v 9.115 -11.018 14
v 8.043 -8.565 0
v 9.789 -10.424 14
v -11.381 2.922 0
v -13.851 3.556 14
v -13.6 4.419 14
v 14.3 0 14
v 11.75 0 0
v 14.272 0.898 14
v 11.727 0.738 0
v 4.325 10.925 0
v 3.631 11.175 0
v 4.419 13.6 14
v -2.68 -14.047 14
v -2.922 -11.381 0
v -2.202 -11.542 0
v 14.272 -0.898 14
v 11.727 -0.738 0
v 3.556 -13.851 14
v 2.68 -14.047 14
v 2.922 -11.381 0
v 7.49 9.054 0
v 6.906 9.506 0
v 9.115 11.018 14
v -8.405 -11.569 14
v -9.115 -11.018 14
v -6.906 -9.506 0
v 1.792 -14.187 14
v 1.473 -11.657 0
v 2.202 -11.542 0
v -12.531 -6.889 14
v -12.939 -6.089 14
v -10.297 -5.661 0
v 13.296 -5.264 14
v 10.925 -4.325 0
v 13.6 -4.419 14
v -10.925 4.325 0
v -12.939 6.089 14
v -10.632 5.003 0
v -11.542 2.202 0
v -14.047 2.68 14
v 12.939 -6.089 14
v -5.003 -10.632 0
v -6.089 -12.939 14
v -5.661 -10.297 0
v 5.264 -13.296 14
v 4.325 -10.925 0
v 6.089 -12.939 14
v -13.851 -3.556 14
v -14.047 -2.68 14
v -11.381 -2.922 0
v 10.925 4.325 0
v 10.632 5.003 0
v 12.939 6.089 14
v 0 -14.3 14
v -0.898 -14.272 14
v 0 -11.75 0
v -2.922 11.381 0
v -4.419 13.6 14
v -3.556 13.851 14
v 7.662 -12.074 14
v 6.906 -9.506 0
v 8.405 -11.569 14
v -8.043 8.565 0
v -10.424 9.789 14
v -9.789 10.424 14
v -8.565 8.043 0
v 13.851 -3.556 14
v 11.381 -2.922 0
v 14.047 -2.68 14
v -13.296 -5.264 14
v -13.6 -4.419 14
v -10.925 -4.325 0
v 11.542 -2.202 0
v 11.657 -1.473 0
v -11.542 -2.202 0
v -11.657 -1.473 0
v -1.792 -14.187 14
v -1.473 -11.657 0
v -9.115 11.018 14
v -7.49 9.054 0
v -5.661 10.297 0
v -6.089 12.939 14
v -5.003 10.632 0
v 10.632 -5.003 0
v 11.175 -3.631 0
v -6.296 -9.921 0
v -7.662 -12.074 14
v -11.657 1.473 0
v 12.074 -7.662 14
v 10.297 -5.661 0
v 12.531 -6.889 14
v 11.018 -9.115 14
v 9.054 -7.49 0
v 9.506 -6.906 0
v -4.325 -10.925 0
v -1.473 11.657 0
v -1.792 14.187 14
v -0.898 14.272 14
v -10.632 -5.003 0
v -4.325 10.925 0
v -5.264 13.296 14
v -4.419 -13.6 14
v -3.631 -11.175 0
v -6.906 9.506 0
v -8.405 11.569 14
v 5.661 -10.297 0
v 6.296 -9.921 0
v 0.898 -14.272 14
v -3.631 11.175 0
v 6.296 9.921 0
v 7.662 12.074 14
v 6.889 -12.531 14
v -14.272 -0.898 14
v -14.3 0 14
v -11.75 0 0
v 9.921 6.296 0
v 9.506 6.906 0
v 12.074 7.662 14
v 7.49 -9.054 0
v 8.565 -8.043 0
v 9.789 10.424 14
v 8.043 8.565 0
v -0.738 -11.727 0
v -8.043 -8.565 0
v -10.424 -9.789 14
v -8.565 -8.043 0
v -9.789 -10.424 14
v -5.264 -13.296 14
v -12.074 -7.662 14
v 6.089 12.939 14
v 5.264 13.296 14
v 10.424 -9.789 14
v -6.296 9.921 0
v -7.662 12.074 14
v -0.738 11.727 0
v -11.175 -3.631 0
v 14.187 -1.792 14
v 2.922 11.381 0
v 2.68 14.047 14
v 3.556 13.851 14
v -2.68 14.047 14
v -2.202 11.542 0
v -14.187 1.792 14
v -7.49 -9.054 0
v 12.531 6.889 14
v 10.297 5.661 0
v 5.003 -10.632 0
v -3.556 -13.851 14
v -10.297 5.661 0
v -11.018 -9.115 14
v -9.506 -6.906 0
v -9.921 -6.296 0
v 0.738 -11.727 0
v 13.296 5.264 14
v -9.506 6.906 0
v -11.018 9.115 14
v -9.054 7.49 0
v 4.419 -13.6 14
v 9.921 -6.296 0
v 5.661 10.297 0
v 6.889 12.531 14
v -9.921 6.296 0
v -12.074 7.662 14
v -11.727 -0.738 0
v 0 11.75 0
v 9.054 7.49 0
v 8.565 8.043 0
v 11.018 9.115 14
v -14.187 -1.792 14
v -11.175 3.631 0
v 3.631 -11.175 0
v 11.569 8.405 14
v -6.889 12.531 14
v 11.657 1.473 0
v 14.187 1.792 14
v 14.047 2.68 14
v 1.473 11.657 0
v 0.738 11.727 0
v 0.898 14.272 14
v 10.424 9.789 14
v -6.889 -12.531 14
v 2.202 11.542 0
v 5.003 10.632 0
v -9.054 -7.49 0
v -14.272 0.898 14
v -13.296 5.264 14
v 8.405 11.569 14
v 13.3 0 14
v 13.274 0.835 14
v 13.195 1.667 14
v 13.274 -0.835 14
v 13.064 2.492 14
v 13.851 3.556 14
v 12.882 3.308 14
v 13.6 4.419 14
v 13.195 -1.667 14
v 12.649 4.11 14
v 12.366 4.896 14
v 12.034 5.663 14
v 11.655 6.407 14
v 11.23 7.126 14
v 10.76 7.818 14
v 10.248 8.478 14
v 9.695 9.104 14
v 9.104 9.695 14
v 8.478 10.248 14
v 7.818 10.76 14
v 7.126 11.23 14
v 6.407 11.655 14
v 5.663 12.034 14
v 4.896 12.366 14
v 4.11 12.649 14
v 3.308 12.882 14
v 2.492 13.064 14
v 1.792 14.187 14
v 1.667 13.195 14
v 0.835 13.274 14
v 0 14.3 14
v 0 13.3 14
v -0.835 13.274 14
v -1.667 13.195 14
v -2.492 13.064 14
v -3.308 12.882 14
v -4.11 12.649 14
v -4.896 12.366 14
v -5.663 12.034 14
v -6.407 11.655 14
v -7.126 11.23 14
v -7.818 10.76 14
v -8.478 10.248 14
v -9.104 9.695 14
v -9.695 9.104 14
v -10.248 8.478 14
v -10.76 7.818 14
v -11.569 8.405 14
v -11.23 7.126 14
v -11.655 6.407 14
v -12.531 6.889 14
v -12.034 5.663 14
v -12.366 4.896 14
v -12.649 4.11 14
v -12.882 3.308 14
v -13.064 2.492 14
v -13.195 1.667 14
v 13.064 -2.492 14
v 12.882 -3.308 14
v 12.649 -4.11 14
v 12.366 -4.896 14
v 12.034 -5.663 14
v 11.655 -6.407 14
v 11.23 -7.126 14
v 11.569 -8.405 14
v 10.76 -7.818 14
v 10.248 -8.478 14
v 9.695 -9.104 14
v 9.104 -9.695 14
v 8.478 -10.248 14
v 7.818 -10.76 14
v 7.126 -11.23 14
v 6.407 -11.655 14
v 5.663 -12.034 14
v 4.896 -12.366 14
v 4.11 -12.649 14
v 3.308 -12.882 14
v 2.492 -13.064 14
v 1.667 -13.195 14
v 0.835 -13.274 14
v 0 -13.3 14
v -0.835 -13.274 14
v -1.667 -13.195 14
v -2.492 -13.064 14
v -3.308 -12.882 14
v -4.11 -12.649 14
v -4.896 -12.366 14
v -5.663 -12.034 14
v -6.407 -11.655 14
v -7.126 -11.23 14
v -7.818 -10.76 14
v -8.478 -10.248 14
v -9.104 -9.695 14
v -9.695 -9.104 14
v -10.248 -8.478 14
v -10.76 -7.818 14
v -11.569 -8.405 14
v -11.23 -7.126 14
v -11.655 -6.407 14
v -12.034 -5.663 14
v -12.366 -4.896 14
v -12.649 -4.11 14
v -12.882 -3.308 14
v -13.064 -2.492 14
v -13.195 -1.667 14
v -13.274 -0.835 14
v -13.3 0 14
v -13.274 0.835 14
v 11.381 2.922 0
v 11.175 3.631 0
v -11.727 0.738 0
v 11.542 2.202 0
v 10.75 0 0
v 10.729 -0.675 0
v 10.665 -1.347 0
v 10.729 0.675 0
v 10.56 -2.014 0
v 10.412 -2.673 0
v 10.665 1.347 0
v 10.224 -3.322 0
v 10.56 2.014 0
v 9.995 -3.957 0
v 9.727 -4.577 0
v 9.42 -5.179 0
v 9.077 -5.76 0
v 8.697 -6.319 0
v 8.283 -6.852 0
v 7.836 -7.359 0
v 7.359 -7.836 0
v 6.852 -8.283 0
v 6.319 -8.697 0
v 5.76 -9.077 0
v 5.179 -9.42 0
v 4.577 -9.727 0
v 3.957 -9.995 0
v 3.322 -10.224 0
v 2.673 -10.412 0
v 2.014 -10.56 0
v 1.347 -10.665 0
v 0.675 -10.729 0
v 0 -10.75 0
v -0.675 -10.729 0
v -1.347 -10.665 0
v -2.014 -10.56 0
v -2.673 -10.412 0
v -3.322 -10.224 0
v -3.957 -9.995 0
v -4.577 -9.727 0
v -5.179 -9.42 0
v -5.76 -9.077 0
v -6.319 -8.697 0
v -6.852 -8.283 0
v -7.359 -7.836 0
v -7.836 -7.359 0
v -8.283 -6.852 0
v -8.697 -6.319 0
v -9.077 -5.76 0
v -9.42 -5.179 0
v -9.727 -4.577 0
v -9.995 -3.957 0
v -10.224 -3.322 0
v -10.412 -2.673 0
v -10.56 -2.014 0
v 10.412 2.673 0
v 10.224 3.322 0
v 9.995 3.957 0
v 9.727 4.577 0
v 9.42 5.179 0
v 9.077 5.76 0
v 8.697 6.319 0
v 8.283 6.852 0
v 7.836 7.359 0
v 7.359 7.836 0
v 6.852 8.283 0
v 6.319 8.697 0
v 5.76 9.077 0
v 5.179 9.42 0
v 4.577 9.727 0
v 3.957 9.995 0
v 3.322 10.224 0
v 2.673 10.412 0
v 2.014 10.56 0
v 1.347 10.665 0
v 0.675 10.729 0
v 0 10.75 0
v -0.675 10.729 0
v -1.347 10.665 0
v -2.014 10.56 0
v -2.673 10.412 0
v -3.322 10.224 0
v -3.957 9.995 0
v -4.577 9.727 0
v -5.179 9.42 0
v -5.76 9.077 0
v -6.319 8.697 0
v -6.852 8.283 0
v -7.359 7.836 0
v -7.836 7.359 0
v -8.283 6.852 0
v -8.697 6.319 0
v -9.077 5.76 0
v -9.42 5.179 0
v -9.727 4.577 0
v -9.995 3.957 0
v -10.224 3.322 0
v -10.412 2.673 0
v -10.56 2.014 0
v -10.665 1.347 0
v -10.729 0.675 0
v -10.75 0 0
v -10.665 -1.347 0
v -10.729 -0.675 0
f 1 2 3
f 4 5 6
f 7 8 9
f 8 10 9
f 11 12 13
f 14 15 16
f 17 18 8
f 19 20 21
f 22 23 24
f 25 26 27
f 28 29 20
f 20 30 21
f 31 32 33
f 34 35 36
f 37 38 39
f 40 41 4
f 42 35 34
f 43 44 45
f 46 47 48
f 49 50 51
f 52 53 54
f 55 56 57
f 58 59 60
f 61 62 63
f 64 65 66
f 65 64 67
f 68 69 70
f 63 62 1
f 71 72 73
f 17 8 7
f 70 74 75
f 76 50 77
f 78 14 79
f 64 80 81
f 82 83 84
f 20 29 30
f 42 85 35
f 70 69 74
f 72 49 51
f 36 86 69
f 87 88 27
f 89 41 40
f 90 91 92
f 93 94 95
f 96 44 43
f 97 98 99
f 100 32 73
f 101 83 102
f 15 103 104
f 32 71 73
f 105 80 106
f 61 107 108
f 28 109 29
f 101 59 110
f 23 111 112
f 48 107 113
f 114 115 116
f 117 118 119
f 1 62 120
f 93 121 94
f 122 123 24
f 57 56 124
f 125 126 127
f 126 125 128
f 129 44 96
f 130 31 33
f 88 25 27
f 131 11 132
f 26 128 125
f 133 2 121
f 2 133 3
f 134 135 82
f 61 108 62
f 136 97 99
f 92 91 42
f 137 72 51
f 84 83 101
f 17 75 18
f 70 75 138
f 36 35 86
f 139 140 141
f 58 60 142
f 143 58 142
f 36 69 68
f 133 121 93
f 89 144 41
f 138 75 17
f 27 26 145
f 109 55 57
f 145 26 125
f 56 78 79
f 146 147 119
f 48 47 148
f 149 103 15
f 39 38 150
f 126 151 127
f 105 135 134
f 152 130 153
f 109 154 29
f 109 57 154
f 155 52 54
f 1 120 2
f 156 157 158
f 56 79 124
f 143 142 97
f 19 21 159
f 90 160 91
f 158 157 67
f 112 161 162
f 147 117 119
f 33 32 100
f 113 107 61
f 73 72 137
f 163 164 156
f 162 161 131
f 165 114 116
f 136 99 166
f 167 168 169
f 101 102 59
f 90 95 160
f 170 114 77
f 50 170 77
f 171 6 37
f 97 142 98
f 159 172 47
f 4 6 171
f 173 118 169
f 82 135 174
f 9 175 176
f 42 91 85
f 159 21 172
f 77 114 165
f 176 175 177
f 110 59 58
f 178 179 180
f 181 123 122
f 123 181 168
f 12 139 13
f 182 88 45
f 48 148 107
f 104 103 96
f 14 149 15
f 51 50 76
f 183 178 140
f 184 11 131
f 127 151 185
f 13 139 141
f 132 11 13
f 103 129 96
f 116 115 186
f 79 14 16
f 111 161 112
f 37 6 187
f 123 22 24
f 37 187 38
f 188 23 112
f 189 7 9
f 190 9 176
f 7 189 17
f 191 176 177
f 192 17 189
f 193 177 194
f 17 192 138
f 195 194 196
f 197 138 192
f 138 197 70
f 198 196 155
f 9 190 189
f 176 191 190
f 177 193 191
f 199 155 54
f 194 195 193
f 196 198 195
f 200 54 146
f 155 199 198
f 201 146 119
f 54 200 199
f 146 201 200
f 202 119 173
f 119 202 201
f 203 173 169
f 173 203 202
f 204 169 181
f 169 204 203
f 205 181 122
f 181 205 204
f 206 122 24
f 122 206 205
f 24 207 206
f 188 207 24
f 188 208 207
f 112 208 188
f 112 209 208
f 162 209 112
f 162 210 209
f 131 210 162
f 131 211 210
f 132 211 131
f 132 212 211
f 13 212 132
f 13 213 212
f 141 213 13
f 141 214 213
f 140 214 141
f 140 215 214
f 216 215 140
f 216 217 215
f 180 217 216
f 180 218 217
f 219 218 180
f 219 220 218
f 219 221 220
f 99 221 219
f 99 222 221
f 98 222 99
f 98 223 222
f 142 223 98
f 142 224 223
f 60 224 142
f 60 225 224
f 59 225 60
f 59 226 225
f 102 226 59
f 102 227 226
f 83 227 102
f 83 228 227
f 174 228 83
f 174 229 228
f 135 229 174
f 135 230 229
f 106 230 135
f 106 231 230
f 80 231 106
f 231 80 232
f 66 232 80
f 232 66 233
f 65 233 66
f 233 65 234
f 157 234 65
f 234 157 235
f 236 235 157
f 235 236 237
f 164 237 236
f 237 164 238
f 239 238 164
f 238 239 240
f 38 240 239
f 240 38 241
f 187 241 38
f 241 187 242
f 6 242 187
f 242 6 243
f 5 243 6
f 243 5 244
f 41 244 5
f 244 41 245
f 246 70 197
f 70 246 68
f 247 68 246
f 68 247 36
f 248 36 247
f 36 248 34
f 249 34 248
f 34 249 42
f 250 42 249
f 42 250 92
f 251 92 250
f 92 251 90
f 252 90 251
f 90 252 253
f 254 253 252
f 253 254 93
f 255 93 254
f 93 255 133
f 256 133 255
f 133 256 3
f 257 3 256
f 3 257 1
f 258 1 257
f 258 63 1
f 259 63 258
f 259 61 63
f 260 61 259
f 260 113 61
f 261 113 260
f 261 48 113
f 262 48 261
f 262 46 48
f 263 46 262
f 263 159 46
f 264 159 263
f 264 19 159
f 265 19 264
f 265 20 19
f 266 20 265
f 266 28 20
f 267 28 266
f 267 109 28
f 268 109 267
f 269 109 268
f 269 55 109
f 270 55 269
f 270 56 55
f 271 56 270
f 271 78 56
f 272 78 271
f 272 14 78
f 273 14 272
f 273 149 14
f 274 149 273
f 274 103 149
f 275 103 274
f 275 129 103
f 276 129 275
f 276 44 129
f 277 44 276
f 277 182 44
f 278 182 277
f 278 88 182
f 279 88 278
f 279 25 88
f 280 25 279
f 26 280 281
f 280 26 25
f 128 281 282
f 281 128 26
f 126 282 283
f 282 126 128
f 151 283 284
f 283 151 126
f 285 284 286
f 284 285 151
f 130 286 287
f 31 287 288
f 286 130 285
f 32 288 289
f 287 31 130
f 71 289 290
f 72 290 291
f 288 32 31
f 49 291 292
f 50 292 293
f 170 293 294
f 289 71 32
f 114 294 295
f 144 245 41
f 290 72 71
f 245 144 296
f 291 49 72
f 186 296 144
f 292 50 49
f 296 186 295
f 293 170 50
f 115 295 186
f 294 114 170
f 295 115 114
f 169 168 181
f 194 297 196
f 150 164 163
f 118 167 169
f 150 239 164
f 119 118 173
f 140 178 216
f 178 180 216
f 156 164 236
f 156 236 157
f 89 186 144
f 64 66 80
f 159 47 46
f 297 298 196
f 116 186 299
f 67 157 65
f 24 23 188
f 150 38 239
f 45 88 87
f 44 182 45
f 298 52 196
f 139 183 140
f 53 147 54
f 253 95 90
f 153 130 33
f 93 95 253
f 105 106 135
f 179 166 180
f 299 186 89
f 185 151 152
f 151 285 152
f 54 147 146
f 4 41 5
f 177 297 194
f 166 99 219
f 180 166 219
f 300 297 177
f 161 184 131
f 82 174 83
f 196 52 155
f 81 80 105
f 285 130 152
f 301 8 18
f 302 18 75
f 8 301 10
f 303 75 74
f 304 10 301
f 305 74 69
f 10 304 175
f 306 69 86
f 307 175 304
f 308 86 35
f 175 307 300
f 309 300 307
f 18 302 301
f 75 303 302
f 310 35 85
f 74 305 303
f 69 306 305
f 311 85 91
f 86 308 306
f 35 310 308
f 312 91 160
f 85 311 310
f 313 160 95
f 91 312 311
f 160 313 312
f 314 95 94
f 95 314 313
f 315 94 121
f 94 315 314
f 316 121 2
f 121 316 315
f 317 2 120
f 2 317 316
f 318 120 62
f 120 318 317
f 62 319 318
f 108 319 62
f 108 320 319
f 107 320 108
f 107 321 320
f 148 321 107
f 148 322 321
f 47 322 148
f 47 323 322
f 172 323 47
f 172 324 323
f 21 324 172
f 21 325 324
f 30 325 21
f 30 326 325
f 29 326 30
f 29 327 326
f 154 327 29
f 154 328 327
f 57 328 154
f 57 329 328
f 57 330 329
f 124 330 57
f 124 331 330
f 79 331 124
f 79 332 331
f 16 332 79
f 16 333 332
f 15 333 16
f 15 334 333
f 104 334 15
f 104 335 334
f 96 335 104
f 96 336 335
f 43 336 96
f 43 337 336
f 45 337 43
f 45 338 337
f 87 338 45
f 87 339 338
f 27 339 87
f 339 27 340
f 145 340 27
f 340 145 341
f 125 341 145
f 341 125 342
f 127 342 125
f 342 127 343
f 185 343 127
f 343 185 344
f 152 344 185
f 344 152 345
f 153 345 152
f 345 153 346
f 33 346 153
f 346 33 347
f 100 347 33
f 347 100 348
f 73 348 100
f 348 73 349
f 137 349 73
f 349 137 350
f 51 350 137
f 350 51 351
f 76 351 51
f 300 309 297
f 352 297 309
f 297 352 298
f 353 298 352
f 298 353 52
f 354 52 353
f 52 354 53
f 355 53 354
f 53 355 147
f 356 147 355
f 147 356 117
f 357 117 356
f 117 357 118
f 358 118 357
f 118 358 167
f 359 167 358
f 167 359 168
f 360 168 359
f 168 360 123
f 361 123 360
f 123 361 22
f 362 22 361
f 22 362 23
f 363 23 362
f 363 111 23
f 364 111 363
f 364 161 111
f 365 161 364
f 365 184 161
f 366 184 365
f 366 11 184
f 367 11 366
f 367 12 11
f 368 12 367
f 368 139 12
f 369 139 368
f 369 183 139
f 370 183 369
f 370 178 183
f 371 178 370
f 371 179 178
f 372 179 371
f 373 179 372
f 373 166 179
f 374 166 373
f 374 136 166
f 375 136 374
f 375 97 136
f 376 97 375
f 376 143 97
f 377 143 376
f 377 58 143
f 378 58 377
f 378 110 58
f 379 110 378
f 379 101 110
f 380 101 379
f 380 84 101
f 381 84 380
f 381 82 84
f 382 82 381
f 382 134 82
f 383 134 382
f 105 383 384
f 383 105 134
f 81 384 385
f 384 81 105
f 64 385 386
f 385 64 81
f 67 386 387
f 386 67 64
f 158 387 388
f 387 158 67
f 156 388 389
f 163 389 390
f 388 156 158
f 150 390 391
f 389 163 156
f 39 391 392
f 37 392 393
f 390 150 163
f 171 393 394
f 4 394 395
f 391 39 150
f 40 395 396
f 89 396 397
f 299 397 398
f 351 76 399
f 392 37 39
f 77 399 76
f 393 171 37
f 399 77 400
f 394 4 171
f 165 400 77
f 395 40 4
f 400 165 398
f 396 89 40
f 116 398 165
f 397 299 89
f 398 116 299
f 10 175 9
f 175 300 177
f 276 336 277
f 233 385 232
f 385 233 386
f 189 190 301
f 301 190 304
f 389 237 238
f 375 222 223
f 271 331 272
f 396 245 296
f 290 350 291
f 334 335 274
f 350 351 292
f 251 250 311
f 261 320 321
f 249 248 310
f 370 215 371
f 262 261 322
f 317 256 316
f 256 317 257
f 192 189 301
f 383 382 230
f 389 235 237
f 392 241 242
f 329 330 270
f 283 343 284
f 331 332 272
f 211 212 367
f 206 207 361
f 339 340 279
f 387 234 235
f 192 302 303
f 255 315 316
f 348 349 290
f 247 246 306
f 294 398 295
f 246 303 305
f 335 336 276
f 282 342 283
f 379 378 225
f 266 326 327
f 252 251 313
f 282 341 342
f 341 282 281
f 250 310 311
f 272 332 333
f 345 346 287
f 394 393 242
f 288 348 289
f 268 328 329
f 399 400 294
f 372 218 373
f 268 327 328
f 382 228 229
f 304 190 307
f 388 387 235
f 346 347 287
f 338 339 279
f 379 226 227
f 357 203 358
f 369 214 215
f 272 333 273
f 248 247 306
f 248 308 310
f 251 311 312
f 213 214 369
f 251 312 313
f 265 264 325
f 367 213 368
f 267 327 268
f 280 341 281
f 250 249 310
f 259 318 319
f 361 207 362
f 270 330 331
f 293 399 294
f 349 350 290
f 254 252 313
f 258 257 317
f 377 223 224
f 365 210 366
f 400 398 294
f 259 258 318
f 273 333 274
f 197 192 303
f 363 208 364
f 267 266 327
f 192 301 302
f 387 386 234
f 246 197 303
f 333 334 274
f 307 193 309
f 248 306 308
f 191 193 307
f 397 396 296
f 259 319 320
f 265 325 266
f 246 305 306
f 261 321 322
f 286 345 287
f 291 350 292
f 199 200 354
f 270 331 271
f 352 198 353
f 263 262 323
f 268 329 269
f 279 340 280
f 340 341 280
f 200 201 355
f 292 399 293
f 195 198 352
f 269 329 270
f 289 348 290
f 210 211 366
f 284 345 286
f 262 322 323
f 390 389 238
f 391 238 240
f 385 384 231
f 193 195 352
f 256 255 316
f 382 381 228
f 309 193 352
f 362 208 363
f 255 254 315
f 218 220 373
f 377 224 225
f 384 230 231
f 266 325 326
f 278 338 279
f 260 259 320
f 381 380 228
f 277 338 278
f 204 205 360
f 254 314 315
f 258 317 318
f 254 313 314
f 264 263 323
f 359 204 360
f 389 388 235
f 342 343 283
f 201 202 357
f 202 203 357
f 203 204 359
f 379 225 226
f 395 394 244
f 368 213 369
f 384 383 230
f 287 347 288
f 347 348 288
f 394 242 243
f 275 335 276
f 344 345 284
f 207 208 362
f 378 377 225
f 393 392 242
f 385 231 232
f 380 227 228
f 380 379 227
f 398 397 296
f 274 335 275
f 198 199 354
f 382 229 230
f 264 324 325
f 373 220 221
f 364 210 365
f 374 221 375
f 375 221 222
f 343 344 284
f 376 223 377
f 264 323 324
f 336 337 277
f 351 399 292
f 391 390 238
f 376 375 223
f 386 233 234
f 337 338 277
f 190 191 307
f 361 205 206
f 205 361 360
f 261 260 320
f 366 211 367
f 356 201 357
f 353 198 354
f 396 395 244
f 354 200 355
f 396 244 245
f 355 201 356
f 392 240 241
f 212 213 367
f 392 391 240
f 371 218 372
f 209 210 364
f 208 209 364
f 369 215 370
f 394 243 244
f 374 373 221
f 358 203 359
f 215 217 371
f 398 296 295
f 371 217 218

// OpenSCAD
module cone()
{
  wall=1;
  $fn=100;
  r1=21.5;
  r2=26.6;
  h=14;
  difference()
  {
    cylinder(r1=r1/2+wall, r2=r2/2+wall, h=h);
    cylinder(r1=r1/2,      r2=r2/2,      h=h);
  }
}

cone();
